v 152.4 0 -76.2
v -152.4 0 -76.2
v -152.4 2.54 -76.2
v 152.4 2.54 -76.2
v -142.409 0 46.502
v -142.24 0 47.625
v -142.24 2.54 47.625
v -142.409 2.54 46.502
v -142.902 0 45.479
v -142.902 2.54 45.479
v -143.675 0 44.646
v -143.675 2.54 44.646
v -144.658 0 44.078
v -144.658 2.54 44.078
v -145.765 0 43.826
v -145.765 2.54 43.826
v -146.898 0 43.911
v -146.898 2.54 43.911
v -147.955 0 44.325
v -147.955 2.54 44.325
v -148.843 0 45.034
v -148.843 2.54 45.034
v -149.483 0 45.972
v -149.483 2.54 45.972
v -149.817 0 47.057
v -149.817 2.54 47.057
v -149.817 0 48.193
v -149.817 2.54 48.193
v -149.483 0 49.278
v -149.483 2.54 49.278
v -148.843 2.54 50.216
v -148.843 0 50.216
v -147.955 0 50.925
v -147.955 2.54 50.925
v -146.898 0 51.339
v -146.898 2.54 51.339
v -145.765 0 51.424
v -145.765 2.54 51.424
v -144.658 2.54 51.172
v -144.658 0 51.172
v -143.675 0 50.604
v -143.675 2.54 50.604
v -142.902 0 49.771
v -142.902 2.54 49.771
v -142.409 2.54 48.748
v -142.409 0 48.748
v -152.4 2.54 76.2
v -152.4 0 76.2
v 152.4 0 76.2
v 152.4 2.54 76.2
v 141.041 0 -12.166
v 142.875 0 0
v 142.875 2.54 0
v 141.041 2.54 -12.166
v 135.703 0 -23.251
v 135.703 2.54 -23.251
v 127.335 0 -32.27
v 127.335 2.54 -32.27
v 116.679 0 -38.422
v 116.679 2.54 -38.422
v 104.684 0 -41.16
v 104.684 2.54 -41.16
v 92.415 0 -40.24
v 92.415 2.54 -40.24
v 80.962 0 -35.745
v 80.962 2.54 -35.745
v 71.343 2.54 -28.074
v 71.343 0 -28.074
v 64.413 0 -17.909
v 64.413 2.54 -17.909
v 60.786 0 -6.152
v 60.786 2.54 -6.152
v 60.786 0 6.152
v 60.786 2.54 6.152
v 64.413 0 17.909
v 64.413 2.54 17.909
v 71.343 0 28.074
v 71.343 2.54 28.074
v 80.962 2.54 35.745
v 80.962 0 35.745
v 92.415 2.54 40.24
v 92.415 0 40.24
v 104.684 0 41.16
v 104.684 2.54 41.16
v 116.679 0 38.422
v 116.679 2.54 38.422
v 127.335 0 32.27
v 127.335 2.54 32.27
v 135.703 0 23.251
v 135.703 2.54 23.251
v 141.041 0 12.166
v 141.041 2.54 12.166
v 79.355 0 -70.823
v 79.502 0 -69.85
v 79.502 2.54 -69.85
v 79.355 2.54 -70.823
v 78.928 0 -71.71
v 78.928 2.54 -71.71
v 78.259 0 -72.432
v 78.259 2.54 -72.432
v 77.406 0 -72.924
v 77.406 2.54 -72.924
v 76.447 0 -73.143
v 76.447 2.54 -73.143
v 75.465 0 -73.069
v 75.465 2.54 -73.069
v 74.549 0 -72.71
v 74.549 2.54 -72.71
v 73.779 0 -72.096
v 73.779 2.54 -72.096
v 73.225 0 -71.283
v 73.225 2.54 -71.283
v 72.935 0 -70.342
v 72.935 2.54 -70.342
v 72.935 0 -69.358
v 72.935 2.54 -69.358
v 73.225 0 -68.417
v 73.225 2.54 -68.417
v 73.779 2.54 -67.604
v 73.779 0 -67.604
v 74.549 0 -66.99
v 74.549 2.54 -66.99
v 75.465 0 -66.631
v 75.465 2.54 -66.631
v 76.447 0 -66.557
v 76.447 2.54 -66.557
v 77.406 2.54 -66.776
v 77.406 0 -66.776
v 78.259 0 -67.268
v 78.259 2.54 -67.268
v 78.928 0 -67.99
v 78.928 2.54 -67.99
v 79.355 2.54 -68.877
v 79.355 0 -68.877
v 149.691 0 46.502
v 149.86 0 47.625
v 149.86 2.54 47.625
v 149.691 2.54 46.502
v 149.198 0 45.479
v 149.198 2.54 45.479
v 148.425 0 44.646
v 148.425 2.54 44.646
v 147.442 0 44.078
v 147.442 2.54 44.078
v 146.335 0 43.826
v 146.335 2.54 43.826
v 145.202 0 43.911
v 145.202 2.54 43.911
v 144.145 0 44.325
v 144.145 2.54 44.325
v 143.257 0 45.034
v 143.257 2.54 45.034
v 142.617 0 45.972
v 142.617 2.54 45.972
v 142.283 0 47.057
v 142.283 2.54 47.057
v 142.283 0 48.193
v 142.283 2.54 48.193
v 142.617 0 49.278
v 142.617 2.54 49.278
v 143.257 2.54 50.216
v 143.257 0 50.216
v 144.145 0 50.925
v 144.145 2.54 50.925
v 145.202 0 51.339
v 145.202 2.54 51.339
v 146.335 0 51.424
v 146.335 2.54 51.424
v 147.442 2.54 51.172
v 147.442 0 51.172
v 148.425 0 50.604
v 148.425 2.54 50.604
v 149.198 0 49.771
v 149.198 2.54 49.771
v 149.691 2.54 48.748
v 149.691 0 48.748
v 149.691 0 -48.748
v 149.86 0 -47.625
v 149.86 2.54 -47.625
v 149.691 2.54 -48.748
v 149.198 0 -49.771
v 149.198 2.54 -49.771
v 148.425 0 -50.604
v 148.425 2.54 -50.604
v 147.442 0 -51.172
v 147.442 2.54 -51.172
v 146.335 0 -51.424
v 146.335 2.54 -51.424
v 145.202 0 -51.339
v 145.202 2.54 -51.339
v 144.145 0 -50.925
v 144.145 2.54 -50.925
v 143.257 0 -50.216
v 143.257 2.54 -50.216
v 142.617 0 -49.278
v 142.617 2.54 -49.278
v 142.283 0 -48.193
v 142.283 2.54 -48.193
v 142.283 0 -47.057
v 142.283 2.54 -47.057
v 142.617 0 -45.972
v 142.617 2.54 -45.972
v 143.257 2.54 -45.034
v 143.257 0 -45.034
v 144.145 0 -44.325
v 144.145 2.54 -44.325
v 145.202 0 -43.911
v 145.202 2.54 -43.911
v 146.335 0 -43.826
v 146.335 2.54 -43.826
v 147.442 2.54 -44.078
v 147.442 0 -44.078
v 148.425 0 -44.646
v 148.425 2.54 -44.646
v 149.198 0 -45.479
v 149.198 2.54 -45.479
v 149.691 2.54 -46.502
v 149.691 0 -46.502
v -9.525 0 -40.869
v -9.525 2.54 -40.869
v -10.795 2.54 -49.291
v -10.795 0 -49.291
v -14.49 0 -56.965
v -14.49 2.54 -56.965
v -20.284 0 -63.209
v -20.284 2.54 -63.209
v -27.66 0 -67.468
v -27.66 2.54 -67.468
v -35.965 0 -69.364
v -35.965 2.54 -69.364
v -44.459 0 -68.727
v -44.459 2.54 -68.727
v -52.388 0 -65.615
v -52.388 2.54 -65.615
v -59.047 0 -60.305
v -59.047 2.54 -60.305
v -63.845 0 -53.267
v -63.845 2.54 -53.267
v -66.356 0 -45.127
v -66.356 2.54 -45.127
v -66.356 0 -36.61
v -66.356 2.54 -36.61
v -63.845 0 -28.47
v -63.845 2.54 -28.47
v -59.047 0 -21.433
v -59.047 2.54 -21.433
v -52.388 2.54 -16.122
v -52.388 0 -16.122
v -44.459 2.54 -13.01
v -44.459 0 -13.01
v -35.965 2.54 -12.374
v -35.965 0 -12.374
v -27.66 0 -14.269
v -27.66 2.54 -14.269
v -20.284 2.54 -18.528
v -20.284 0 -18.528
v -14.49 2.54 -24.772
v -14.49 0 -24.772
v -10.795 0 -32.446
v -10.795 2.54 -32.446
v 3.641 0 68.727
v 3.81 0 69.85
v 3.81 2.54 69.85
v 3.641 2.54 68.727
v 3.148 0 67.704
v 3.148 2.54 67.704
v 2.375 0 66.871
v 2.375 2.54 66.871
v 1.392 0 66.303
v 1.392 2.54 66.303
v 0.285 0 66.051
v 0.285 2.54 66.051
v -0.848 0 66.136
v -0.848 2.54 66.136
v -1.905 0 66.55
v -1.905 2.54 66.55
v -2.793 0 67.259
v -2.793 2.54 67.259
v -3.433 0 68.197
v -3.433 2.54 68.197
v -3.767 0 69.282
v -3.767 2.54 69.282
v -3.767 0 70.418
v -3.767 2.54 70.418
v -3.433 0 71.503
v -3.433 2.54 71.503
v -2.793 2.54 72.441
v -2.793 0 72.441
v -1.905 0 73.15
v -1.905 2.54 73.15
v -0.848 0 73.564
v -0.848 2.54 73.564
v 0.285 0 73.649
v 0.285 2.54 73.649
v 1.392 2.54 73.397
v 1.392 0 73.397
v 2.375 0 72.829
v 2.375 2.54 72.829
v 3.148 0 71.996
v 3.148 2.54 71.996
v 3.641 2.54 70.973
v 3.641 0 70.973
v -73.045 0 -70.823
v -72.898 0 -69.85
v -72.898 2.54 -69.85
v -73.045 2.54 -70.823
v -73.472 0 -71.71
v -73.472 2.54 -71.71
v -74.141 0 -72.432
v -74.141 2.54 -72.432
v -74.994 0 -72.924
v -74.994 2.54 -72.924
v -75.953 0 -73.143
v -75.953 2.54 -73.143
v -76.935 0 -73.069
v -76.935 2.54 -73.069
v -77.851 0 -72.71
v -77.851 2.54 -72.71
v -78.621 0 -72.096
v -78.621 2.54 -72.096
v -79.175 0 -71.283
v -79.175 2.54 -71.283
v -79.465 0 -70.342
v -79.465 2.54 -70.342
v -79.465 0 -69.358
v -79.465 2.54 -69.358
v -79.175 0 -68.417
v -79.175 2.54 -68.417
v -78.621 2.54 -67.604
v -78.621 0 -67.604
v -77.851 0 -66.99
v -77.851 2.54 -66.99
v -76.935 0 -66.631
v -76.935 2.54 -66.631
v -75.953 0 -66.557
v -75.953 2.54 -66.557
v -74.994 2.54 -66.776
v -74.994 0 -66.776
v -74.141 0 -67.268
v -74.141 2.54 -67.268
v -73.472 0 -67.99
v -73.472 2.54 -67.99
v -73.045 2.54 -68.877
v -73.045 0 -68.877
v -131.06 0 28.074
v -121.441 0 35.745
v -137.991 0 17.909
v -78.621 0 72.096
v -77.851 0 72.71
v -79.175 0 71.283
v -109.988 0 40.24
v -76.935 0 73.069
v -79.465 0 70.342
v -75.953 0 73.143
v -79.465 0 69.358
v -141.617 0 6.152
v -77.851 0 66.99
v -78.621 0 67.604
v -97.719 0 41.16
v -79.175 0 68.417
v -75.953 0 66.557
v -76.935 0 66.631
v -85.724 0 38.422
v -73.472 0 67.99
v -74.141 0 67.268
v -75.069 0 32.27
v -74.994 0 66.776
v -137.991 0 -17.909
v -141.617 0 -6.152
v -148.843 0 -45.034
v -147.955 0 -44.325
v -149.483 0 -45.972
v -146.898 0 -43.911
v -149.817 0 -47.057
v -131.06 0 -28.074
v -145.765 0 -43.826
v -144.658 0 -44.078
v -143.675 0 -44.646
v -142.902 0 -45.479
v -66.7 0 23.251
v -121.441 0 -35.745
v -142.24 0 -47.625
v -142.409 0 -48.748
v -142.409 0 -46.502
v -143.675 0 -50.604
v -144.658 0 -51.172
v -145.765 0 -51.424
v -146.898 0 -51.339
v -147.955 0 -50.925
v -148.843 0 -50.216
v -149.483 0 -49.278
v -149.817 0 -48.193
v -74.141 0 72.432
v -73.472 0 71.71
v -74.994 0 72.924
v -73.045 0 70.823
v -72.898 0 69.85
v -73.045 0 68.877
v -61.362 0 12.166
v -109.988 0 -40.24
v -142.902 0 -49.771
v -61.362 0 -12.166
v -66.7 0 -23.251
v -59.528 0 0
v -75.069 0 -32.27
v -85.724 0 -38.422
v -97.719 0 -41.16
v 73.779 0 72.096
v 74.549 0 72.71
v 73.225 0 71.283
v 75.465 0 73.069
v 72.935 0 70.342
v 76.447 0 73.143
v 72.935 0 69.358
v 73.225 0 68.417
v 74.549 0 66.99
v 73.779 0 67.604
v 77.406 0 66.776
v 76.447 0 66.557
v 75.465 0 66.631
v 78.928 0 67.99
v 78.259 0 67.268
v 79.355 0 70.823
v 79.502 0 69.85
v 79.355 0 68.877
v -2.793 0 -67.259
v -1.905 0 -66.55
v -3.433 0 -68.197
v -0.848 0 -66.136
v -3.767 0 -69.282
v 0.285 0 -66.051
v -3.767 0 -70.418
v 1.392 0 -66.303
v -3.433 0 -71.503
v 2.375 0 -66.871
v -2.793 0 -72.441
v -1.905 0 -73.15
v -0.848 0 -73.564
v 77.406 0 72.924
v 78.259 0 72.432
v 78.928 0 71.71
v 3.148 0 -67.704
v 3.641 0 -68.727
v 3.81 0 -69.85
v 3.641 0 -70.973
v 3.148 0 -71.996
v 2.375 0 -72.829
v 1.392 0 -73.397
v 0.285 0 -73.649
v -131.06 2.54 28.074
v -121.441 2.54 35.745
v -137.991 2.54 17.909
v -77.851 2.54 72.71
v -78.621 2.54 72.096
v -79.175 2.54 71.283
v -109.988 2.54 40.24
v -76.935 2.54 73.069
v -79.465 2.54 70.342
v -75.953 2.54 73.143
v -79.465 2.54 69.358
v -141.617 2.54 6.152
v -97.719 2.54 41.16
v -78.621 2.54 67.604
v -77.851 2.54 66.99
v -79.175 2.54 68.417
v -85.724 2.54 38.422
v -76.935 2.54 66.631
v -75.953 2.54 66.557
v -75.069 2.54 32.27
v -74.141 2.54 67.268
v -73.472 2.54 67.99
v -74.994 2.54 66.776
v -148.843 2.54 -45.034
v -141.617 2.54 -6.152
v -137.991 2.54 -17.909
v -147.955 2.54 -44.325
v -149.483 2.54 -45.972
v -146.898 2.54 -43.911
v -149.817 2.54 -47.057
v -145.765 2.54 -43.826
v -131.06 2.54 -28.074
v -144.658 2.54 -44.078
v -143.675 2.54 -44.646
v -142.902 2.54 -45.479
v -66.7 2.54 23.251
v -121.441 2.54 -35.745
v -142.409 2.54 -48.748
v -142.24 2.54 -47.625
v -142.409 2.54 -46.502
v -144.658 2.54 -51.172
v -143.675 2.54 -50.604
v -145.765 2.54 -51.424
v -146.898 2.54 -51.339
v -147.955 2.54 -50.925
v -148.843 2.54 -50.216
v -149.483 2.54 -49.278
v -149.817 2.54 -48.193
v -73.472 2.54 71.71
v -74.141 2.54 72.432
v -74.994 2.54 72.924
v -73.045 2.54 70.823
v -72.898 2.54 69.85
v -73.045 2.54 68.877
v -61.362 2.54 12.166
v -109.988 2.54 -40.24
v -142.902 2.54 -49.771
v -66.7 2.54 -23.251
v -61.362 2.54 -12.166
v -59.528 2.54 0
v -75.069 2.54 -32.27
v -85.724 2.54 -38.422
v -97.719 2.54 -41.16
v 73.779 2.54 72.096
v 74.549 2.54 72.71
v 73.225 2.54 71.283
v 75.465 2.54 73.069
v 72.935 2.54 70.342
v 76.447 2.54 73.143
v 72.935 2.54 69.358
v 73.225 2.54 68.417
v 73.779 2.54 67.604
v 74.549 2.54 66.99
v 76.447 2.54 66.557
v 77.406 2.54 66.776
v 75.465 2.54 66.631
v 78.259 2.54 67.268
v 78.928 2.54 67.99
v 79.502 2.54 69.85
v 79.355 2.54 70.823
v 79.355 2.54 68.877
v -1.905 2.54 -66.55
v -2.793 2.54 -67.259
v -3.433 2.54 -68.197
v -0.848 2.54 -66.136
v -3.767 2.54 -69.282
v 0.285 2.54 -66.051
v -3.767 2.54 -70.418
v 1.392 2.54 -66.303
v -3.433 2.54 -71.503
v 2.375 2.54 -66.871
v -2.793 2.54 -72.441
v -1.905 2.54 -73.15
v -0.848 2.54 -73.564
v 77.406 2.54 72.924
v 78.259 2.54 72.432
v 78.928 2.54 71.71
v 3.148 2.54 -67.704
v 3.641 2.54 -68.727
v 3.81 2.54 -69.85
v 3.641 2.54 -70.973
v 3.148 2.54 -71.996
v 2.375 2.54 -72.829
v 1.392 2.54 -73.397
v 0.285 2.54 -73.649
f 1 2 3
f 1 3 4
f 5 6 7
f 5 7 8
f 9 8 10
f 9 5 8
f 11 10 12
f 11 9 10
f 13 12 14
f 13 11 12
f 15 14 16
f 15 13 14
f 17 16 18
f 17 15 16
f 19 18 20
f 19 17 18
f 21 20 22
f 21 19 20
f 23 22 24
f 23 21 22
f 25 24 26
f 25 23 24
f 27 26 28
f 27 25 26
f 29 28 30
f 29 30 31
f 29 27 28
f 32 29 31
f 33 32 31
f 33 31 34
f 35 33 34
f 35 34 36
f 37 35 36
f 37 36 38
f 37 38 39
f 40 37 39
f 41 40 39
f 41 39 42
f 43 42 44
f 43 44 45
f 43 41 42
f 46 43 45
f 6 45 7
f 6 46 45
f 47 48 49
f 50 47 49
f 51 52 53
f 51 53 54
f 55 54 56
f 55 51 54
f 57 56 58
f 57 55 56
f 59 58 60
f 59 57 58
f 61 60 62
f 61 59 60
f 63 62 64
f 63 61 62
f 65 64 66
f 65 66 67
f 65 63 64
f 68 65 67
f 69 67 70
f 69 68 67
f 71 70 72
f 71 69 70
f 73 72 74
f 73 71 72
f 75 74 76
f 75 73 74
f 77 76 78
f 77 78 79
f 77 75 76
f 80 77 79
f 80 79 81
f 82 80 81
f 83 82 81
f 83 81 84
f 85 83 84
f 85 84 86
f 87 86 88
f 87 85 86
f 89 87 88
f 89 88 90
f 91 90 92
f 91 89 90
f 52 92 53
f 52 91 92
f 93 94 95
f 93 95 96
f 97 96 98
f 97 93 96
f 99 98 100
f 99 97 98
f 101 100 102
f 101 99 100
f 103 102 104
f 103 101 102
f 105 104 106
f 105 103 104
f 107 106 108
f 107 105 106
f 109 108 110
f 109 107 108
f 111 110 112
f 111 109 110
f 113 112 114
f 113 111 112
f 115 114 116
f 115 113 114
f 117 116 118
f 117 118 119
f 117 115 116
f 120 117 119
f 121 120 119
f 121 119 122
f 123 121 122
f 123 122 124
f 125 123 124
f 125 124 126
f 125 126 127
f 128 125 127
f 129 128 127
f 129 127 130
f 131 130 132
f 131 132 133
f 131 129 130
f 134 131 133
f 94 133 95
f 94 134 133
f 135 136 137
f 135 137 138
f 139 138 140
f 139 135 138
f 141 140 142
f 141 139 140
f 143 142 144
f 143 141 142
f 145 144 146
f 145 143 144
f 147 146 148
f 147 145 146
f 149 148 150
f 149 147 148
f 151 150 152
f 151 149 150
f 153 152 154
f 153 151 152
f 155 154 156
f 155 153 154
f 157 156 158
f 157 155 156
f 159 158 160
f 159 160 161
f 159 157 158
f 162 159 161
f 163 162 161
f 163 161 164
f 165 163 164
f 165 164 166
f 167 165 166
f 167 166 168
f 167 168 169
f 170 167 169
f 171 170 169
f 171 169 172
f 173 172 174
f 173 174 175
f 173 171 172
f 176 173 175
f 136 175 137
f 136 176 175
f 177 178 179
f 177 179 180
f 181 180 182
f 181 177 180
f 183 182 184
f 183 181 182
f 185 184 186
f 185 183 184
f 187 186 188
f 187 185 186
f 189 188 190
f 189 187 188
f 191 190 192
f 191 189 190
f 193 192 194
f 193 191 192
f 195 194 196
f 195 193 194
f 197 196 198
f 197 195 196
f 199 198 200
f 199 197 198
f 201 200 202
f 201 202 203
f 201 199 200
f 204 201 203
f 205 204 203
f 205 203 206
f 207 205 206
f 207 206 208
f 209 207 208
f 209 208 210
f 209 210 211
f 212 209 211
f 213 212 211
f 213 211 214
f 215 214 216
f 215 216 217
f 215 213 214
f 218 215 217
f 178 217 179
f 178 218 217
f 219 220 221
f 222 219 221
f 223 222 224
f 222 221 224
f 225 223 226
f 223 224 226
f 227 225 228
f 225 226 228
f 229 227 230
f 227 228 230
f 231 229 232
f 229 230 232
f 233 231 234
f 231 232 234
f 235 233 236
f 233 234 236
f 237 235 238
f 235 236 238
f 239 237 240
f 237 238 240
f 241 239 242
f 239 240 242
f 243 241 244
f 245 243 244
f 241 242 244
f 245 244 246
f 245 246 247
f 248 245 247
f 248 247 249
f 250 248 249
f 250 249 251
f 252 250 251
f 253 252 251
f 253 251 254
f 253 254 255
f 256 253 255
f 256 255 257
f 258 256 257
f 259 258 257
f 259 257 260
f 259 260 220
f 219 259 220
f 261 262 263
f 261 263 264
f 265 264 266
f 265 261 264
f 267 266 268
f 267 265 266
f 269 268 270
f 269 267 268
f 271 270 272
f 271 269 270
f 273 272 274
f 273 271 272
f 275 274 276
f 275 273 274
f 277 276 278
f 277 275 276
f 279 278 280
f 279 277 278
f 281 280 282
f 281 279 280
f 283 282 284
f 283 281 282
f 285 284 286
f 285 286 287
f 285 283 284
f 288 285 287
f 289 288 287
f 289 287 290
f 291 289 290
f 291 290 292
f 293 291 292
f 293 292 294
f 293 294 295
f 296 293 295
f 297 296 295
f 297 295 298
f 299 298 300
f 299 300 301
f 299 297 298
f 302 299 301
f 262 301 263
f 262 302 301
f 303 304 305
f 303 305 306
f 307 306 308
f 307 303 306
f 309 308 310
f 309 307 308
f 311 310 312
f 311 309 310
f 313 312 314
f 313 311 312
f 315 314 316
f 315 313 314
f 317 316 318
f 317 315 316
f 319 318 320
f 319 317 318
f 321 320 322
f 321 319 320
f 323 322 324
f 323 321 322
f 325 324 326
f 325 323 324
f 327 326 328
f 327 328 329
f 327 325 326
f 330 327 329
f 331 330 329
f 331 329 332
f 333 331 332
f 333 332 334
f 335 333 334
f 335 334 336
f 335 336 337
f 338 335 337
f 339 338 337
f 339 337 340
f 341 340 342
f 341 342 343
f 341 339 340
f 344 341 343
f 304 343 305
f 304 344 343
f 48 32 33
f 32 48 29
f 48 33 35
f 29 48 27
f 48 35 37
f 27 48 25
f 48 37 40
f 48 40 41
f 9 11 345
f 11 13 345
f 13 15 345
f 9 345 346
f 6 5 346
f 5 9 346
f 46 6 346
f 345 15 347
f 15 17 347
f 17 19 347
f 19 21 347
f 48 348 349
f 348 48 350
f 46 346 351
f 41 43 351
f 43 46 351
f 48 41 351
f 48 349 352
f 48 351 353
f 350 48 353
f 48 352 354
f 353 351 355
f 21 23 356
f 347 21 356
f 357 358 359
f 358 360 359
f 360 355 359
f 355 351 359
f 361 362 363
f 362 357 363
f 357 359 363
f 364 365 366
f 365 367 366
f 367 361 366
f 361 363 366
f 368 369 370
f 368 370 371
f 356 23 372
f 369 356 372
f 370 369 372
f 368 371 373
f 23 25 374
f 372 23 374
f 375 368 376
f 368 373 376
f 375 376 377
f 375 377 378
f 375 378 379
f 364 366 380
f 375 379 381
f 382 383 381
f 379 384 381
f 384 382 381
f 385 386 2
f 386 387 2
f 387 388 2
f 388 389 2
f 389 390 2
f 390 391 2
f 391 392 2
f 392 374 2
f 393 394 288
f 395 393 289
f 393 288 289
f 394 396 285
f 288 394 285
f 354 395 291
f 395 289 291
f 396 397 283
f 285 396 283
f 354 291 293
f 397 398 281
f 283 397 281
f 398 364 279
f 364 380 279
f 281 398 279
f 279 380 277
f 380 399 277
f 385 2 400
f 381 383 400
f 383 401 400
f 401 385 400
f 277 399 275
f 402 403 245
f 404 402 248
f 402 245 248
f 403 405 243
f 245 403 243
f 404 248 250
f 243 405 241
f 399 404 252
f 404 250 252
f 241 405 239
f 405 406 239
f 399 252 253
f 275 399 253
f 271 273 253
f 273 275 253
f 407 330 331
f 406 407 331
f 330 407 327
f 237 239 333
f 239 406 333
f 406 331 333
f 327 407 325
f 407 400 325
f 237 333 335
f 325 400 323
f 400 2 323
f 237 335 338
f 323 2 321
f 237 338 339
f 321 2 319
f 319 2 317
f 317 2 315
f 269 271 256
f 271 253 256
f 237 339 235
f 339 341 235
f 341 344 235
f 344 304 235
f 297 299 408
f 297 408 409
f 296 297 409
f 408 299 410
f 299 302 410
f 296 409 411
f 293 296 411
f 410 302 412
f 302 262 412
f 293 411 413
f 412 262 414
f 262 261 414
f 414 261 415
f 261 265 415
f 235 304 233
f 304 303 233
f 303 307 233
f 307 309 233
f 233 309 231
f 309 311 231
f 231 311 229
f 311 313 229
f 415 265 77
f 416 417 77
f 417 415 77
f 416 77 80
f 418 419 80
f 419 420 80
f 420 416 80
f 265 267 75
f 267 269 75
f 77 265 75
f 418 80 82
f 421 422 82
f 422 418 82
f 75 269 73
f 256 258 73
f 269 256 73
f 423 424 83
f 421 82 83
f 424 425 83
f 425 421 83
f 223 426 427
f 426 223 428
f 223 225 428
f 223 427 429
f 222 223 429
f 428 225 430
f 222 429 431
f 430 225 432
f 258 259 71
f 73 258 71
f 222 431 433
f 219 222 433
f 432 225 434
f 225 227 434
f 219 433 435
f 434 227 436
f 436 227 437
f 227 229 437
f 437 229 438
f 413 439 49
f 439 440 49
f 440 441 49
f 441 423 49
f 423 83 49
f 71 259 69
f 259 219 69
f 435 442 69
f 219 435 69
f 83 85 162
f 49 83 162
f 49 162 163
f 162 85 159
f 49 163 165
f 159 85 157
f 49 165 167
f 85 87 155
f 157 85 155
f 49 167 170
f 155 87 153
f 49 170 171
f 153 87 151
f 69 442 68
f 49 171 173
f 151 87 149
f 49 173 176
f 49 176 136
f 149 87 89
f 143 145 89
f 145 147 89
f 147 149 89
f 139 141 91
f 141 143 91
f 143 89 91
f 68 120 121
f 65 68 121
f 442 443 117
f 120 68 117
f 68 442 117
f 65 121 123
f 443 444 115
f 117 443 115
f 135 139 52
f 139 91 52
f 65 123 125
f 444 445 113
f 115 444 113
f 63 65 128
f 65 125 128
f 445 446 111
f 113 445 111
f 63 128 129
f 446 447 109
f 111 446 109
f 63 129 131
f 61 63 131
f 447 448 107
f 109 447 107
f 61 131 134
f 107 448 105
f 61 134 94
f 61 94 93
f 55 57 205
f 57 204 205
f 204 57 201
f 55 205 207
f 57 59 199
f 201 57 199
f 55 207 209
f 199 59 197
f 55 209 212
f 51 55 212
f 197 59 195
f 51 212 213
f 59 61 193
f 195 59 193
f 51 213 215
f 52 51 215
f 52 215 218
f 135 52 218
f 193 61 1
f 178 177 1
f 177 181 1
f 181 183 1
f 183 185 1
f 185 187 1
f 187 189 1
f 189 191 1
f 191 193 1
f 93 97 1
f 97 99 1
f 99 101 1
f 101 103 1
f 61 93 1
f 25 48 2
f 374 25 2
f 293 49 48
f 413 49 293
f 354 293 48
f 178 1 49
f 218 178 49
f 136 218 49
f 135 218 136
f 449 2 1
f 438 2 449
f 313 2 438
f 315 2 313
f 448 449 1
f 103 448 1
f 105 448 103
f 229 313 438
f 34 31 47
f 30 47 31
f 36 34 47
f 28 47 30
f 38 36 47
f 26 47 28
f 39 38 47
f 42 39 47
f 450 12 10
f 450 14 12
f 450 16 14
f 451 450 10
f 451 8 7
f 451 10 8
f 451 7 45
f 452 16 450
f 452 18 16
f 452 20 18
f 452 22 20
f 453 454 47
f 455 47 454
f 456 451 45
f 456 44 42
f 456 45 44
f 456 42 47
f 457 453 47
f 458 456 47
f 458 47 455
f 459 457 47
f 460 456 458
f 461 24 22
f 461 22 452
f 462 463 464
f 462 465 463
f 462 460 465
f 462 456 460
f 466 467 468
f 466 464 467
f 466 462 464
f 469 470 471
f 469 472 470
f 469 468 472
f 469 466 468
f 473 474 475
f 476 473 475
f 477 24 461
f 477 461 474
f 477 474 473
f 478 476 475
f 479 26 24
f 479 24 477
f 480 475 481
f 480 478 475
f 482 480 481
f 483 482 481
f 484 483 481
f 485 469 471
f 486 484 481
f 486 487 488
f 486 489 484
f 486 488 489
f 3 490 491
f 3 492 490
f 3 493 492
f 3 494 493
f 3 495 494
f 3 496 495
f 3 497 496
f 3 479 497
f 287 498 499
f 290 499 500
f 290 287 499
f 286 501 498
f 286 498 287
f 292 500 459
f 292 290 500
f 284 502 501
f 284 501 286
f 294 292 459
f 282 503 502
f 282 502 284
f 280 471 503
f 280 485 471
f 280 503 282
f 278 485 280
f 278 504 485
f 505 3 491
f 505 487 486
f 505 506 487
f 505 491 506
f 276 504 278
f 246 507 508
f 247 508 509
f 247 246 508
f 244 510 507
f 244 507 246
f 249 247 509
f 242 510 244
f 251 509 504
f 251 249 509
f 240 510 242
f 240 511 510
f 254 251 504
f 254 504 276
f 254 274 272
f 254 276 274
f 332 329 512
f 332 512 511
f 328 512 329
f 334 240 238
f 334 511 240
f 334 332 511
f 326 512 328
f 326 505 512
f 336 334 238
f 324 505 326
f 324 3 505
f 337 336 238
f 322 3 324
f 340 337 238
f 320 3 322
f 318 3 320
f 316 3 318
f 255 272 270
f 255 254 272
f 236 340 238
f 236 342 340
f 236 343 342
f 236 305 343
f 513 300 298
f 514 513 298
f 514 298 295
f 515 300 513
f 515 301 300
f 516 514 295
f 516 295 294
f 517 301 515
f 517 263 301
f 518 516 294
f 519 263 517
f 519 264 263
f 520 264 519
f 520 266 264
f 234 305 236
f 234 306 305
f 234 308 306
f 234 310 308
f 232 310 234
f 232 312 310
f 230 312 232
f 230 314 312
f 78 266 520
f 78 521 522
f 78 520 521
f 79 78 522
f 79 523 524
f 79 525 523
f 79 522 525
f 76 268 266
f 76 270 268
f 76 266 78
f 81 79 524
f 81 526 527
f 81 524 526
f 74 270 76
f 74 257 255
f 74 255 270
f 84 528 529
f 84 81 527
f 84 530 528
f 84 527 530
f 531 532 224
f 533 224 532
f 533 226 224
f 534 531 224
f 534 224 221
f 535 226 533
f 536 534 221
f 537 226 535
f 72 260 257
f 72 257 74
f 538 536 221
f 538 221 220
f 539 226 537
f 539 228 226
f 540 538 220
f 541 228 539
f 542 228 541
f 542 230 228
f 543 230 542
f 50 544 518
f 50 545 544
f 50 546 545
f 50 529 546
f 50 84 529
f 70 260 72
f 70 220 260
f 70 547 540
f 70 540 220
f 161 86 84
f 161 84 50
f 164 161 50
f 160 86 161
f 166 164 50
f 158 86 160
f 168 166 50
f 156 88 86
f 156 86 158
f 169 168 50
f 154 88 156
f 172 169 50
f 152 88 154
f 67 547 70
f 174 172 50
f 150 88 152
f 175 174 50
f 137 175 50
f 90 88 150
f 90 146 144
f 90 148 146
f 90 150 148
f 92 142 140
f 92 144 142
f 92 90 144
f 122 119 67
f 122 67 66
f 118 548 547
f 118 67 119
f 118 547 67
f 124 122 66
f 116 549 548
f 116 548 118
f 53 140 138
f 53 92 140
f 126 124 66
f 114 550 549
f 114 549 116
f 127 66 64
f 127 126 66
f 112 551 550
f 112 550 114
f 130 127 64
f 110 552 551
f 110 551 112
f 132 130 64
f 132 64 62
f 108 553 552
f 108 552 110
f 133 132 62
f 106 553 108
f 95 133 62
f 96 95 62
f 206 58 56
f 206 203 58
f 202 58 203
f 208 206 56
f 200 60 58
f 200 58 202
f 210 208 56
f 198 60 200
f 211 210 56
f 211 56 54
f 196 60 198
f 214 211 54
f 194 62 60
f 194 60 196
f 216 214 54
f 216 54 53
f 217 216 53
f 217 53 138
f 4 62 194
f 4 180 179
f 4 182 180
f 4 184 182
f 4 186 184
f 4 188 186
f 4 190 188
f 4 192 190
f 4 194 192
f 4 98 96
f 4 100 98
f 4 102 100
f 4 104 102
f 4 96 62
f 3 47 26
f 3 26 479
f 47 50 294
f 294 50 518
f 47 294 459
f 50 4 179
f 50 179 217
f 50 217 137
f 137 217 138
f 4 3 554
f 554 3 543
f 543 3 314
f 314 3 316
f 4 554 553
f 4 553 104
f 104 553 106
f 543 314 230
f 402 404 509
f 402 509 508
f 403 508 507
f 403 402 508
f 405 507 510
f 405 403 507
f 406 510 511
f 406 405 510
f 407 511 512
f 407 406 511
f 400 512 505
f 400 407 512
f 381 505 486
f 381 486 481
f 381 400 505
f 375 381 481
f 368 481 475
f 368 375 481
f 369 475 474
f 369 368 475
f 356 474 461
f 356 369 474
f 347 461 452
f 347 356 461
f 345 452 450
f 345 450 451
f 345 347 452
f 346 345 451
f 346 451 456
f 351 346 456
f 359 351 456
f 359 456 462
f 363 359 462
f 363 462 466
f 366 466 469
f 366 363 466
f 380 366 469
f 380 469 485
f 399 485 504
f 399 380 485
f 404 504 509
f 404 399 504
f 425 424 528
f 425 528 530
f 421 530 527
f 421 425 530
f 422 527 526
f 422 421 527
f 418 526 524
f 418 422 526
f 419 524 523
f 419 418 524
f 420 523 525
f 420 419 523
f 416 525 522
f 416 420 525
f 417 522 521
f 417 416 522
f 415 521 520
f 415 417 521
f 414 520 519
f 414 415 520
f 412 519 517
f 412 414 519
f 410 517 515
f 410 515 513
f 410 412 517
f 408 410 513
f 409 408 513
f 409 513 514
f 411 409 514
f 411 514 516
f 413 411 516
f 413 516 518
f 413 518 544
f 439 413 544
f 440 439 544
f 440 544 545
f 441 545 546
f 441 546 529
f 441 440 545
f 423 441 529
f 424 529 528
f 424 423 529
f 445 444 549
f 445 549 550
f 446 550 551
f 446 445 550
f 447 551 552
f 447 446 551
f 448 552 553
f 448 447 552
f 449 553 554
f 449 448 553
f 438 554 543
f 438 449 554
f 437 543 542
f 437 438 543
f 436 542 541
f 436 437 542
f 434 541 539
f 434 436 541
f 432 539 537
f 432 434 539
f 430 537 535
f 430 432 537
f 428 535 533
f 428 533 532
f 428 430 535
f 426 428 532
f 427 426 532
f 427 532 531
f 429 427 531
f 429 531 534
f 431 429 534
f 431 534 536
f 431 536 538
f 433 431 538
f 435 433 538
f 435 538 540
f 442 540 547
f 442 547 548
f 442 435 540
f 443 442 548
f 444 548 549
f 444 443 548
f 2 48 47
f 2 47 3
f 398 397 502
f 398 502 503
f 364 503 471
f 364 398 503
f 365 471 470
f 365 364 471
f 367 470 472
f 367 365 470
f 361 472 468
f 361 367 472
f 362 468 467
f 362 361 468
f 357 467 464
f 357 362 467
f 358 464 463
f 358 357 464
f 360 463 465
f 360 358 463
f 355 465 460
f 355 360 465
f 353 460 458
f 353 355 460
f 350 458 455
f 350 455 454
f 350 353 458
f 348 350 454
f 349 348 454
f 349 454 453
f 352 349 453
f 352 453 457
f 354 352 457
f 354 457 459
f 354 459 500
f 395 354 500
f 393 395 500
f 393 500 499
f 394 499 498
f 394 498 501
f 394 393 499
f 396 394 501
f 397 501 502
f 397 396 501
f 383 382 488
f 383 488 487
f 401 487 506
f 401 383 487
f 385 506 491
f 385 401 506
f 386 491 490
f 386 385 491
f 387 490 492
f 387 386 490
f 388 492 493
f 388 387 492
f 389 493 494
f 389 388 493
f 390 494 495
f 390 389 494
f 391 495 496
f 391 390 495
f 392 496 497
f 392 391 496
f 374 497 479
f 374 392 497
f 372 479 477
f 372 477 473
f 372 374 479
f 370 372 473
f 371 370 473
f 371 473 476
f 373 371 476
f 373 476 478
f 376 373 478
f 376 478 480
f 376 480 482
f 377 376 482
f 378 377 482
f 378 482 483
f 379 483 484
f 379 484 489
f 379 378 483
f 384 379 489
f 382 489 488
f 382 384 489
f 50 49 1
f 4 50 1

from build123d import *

# Parameters (mm, degrees)
SKETCH1_W           = 304.8
SKETCH1_H           = 152.4
SKETCH1_R           = 41.275
SKETCH1_R_2         = 3.81
SKETCH1_R_3         = 3.302
BOSS_EXTRUDE1_DEPTH = 2.54
SKETCH2_R           = 28.575
CUT_EXTRUDE1_DEPTH  = 3.54


with BuildPart() as part:
    # Sketch1 → Boss-Extrude1 (new body)
    with BuildSketch(Plane(origin=(0, 0, 0), x_dir=(1, 0, 0), z_dir=(0, 1, 0))):
        Rectangle(SKETCH1_W, SKETCH1_H)
        with Locations((-100.803124952, 0)):
            Circle(SKETCH1_R, mode=Mode.SUBTRACT)
        with Locations((101.6, 0)):
            Circle(SKETCH1_R, mode=Mode.SUBTRACT)
        with Locations((146.05, 47.625)):
            Circle(SKETCH1_R_2, mode=Mode.SUBTRACT)
        with Locations((76.2, 69.85)):
            Circle(SKETCH1_R_3, mode=Mode.SUBTRACT)
        with Locations((-146.05, 47.625)):
            Circle(SKETCH1_R_2, mode=Mode.SUBTRACT)
        with Locations((-146.05, -47.625)):
            Circle(SKETCH1_R_2, mode=Mode.SUBTRACT)
        with Locations((-76.2, -69.85)):
            Circle(SKETCH1_R_3, mode=Mode.SUBTRACT)
        with Locations((76.2, -69.85)):
            Circle(SKETCH1_R_3, mode=Mode.SUBTRACT)
        with Locations((146.05, -47.625)):
            Circle(SKETCH1_R_2, mode=Mode.SUBTRACT)
        with Locations((0, -69.85)):
            Circle(SKETCH1_R_2, mode=Mode.SUBTRACT)
        with Locations((-76.2, 69.85)):
            Circle(SKETCH1_R_3, mode=Mode.SUBTRACT)
        with Locations((0, 69.85)):
            Circle(SKETCH1_R_2, mode=Mode.SUBTRACT)
    extrude(amount=BOSS_EXTRUDE1_DEPTH)

    # Sketch2 → Cut-Extrude1 (cut, through all)
    with BuildSketch(Plane(origin=(0, 2.54, 0), x_dir=(1, 0, 0), z_dir=(0, 1, 0))):
        with Locations((-38.1, 40.8686)):
            Circle(SKETCH2_R)
    extrude(amount=-CUT_EXTRUDE1_DEPTH, mode=Mode.SUBTRACT)


solid = part.part
